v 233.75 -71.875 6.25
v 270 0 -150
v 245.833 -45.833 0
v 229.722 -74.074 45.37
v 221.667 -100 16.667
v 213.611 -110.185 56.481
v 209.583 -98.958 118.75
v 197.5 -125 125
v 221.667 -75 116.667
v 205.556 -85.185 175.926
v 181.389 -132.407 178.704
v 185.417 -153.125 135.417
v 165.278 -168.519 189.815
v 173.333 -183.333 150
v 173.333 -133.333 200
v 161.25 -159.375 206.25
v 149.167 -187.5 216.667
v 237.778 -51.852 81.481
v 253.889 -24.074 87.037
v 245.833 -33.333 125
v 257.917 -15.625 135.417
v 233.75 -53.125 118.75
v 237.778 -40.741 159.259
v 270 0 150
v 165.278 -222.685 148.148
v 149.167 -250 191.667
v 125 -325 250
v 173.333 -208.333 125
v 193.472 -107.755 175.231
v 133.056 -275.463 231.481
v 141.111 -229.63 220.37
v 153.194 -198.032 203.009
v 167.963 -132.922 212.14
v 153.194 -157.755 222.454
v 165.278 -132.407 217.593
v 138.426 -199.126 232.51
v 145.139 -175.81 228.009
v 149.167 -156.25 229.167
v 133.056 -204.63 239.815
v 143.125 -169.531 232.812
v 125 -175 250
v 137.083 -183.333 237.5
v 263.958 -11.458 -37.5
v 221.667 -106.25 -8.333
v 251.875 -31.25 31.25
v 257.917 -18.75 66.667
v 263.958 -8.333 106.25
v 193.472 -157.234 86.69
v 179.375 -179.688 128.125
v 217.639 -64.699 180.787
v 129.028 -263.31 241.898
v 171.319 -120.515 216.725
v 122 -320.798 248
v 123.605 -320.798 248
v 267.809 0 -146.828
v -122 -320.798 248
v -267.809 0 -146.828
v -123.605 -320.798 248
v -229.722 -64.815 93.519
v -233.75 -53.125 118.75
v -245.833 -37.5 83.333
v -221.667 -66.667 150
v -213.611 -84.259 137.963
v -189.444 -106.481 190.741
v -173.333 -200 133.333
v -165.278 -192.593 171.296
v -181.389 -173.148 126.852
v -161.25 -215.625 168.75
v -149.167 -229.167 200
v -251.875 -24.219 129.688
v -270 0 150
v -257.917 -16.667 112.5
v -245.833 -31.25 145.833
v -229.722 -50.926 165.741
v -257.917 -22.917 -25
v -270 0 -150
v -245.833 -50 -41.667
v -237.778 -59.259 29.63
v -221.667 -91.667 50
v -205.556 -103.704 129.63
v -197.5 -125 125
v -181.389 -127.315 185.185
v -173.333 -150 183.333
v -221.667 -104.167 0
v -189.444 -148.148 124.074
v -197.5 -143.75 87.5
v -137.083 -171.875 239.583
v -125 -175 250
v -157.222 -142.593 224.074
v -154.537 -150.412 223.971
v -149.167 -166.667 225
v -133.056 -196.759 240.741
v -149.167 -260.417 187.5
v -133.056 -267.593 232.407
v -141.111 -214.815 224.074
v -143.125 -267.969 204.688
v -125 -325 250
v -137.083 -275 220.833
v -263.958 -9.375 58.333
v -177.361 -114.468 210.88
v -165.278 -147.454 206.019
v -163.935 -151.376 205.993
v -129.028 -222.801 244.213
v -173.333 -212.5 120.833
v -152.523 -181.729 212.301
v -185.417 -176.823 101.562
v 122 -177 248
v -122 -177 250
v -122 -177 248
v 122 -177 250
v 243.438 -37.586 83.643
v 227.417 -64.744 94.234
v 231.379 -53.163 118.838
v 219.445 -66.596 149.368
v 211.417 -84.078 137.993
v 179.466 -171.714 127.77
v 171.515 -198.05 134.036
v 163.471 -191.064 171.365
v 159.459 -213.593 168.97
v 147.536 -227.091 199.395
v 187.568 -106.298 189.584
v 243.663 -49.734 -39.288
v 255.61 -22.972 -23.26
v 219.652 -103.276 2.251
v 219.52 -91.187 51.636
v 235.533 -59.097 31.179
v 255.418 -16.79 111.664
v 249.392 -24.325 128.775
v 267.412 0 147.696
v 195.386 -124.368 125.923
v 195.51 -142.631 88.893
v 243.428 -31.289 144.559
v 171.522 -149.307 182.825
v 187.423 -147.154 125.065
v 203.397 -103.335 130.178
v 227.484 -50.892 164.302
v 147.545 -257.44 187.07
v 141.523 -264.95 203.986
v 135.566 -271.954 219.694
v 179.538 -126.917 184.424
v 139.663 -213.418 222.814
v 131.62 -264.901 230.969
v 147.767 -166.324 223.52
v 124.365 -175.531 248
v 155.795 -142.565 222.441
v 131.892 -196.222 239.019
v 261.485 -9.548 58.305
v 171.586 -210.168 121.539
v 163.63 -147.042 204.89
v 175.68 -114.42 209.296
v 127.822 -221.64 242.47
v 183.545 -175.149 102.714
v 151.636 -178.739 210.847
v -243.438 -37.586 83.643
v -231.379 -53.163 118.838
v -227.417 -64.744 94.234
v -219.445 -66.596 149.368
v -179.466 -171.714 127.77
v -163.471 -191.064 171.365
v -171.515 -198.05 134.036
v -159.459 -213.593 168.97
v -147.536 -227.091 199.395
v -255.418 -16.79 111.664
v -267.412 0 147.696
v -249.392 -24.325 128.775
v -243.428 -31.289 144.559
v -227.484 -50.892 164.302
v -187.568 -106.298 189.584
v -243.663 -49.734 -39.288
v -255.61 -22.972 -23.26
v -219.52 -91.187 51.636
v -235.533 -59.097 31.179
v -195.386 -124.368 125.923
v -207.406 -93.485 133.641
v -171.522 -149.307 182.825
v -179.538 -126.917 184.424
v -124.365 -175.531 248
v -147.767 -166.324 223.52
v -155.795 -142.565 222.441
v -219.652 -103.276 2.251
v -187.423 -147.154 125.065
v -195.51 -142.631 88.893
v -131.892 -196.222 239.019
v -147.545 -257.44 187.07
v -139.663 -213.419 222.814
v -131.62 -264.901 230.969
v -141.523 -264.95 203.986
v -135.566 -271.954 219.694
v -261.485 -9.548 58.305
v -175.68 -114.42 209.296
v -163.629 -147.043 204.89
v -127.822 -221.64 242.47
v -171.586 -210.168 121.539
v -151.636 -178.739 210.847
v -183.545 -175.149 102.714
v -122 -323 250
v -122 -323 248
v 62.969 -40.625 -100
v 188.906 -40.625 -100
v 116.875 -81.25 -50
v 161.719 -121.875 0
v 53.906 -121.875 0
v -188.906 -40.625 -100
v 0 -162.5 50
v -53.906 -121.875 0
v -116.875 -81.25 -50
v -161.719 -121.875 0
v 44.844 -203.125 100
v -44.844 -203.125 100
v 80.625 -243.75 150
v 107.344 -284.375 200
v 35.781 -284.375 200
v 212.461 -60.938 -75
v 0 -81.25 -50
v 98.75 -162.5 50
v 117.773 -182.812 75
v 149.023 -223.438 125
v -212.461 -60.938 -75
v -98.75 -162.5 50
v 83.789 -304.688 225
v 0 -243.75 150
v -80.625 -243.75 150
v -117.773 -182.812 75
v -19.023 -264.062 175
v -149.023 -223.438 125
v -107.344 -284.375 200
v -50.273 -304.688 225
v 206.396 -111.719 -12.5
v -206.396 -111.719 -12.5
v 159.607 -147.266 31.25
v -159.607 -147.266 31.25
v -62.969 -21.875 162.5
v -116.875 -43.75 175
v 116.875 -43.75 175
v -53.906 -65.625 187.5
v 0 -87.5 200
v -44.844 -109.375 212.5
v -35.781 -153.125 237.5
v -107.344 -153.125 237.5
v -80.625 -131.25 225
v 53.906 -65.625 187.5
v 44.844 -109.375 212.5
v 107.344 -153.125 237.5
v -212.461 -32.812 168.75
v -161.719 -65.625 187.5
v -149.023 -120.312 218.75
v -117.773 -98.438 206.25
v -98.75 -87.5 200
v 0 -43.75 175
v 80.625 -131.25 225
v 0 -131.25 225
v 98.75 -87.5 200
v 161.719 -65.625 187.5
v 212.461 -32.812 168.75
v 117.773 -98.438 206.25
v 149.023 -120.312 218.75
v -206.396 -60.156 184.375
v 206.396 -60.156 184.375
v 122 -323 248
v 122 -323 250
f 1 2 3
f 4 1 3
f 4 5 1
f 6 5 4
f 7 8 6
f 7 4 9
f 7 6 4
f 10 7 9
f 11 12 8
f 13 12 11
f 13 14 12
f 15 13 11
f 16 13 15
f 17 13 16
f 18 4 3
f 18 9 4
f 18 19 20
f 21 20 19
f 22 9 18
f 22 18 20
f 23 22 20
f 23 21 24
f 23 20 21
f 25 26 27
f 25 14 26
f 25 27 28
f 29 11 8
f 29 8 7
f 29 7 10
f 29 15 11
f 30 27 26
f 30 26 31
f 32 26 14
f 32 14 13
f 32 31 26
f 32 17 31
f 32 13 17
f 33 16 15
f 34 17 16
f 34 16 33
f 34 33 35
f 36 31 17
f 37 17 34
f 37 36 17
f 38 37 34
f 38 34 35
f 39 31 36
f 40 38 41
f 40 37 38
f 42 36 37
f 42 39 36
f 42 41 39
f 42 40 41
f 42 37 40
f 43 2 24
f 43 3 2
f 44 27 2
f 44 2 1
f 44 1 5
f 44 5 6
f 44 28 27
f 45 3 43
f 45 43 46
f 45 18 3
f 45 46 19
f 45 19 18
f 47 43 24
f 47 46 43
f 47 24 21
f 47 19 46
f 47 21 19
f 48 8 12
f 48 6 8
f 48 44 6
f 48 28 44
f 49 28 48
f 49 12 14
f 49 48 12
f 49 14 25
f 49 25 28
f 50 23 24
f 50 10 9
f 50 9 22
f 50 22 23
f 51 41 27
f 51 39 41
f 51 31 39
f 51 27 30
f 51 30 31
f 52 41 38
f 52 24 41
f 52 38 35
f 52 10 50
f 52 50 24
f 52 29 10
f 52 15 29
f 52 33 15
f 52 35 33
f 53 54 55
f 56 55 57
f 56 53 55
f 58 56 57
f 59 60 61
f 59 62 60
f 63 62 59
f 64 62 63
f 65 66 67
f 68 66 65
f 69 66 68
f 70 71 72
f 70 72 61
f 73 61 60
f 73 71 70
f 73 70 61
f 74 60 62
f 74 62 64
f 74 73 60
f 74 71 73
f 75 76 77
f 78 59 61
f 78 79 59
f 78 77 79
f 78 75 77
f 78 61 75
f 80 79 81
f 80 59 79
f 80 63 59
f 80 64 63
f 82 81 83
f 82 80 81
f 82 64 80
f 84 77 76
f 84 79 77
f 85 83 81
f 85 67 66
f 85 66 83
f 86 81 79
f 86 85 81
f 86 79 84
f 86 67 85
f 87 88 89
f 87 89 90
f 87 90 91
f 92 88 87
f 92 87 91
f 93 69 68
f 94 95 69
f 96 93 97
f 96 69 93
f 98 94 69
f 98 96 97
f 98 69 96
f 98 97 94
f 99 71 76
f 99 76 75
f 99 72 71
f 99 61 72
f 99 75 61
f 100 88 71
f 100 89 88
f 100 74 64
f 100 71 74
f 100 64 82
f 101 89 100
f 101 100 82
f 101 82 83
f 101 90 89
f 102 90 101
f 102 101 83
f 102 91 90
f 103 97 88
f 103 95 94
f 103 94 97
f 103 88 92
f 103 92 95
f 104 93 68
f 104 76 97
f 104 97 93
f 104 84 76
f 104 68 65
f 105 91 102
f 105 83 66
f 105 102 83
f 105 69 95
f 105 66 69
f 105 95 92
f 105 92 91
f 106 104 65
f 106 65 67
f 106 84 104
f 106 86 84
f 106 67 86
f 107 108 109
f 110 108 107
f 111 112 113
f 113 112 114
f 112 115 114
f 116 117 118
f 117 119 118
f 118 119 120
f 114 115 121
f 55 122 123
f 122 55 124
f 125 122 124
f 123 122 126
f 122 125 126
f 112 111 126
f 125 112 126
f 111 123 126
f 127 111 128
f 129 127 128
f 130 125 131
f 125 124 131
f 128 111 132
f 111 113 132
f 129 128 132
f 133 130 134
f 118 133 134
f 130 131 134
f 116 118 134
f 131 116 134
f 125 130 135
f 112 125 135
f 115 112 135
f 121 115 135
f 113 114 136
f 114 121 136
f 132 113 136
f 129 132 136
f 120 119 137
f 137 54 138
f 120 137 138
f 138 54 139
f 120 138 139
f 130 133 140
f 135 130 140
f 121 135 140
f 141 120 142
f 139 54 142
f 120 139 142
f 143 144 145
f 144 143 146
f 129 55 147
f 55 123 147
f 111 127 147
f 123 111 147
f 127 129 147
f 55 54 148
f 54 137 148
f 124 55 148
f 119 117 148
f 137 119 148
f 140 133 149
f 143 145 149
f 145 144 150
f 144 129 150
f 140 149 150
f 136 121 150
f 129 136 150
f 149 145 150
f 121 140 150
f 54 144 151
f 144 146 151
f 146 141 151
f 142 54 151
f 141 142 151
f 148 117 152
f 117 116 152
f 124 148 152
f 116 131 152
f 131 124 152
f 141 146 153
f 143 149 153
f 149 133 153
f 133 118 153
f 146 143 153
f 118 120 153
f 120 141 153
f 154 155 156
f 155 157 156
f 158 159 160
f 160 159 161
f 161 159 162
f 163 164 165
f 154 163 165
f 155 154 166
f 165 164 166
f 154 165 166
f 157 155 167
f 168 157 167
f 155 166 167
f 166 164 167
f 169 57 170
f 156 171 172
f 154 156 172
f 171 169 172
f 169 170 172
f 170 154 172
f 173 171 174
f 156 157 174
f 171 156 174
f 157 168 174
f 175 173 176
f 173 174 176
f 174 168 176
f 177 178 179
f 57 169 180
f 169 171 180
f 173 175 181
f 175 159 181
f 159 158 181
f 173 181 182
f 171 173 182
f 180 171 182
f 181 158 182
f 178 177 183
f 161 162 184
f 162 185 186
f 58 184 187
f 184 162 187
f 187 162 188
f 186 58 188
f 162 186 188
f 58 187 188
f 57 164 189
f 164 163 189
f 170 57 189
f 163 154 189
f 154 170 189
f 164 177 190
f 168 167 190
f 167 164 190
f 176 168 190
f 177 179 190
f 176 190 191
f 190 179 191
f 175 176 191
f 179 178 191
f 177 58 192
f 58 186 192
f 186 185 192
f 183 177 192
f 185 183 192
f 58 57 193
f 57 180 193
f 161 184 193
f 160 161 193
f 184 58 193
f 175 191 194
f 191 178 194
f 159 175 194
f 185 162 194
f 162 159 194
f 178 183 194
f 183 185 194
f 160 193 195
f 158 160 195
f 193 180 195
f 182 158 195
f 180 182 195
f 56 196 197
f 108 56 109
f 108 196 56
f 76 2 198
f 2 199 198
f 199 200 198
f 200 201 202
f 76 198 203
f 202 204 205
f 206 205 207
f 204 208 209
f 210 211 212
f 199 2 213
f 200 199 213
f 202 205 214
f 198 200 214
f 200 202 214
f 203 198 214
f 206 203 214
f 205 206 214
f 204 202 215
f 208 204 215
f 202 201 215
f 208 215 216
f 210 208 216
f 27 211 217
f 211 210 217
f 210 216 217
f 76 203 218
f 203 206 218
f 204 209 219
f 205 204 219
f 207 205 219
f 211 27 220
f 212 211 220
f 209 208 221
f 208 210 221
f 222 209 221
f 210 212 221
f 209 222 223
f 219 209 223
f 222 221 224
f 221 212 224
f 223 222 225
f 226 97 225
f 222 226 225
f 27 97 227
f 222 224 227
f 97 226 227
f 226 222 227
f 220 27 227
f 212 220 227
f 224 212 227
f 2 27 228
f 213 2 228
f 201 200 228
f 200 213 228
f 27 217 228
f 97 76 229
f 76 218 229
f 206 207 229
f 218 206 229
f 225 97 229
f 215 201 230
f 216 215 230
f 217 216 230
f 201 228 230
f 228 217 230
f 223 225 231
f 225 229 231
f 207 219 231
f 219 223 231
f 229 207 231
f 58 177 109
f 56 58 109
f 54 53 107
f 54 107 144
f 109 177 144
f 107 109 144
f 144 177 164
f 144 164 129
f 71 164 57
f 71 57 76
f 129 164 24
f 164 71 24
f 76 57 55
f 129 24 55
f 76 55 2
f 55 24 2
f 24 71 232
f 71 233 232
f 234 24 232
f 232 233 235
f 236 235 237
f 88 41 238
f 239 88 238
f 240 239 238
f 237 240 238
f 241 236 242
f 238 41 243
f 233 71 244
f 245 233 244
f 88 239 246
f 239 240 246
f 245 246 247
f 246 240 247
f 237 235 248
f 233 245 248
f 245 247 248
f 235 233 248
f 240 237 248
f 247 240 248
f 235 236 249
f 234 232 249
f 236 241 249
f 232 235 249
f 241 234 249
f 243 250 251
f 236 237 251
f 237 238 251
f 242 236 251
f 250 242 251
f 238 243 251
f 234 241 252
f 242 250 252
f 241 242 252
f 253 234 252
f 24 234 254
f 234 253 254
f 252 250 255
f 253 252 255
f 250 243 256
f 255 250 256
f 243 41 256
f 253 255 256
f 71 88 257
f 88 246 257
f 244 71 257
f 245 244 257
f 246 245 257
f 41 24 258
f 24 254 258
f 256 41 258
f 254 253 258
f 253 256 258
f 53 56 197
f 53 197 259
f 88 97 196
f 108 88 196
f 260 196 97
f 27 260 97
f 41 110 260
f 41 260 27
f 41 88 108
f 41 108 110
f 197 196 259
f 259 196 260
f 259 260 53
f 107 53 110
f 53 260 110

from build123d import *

# Parameters (mm, degrees)
SHELL1_T           = -2
SKETCH4_W          = 244
SKETCH4_H          = 146
CUT_EXTRUDE1_DEPTH = 2


with BuildPart() as part:
    # Loft1: read off the stored shape, not the designer's step
    # Loft1: loft between two sections, ruled curve by curve
    loft1_from = [
        Edge.make_bspline([(270, 0, -150), (270, 0, -100), (270, 0, -50), (270, 0, 50), (270, 0, 100), (270, 0, 150)], [0, 0, 0, 0, 0.5, 0.5, 1, 1, 1, 1], 3),
        Edge.make_bspline([(-270, 0, 150), (-270, 0, 100), (-270, 0, 50), (-270, 0, -50), (-270, 0, -100), (-270, 0, -150)], [0, 0, 0, 0, 0.5, 0.5, 1, 1, 1, 1], 3),
        Edge.make_line((-270, 0, 150), (270, 0, 150)),
        Edge.make_line((270, 0, -150), (-270, 0, -150)),
    ]
    loft1_to = [
        Edge.make_bspline([(125, -325, 250), (125, -300, 250), (125, -275, 250), (125, -225, 250), (125, -200, 250), (125, -175, 250)], [0, 0, 0, 0, 0.5, 0.5, 1, 1, 1, 1], 3),
        Edge.make_bspline([(-125, -175, 250), (-125, -200, 250), (-125, -225, 250), (-125, -275, 250), (-125, -300, 250), (-125, -325, 250)], [0, 0, 0, 0, 0.5, 0.5, 1, 1, 1, 1], 3),
        Edge.make_line((-125, -175, 250), (125, -175, 250)),
        Edge.make_line((125, -325, 250), (-125, -325, 250)),
    ]
    loft1 = Solid(Shell([*[Face.make_surface_from_curves(loft1_from[k], loft1_to[k]) for k in range(4)], Face(Wire(loft1_from)), Face(Wire(loft1_to))]))
    add(loft1)

    # Shell1
    shell1_openings = [part.faces().sort_by_distance(p)[0] for p in [
        (0, 0, 0),
    ]]
    offset(amount=SHELL1_T, openings=shell1_openings, kind=Kind.INTERSECTION)

    # Sketch4 → Cut-Extrude1 (cut)
    with BuildSketch(Plane.XY.offset(250)):
        with Locations((0, -250)):
            Rectangle(SKETCH4_W, SKETCH4_H)
    extrude(amount=-CUT_EXTRUDE1_DEPTH, mode=Mode.SUBTRACT)


solid = part.part
